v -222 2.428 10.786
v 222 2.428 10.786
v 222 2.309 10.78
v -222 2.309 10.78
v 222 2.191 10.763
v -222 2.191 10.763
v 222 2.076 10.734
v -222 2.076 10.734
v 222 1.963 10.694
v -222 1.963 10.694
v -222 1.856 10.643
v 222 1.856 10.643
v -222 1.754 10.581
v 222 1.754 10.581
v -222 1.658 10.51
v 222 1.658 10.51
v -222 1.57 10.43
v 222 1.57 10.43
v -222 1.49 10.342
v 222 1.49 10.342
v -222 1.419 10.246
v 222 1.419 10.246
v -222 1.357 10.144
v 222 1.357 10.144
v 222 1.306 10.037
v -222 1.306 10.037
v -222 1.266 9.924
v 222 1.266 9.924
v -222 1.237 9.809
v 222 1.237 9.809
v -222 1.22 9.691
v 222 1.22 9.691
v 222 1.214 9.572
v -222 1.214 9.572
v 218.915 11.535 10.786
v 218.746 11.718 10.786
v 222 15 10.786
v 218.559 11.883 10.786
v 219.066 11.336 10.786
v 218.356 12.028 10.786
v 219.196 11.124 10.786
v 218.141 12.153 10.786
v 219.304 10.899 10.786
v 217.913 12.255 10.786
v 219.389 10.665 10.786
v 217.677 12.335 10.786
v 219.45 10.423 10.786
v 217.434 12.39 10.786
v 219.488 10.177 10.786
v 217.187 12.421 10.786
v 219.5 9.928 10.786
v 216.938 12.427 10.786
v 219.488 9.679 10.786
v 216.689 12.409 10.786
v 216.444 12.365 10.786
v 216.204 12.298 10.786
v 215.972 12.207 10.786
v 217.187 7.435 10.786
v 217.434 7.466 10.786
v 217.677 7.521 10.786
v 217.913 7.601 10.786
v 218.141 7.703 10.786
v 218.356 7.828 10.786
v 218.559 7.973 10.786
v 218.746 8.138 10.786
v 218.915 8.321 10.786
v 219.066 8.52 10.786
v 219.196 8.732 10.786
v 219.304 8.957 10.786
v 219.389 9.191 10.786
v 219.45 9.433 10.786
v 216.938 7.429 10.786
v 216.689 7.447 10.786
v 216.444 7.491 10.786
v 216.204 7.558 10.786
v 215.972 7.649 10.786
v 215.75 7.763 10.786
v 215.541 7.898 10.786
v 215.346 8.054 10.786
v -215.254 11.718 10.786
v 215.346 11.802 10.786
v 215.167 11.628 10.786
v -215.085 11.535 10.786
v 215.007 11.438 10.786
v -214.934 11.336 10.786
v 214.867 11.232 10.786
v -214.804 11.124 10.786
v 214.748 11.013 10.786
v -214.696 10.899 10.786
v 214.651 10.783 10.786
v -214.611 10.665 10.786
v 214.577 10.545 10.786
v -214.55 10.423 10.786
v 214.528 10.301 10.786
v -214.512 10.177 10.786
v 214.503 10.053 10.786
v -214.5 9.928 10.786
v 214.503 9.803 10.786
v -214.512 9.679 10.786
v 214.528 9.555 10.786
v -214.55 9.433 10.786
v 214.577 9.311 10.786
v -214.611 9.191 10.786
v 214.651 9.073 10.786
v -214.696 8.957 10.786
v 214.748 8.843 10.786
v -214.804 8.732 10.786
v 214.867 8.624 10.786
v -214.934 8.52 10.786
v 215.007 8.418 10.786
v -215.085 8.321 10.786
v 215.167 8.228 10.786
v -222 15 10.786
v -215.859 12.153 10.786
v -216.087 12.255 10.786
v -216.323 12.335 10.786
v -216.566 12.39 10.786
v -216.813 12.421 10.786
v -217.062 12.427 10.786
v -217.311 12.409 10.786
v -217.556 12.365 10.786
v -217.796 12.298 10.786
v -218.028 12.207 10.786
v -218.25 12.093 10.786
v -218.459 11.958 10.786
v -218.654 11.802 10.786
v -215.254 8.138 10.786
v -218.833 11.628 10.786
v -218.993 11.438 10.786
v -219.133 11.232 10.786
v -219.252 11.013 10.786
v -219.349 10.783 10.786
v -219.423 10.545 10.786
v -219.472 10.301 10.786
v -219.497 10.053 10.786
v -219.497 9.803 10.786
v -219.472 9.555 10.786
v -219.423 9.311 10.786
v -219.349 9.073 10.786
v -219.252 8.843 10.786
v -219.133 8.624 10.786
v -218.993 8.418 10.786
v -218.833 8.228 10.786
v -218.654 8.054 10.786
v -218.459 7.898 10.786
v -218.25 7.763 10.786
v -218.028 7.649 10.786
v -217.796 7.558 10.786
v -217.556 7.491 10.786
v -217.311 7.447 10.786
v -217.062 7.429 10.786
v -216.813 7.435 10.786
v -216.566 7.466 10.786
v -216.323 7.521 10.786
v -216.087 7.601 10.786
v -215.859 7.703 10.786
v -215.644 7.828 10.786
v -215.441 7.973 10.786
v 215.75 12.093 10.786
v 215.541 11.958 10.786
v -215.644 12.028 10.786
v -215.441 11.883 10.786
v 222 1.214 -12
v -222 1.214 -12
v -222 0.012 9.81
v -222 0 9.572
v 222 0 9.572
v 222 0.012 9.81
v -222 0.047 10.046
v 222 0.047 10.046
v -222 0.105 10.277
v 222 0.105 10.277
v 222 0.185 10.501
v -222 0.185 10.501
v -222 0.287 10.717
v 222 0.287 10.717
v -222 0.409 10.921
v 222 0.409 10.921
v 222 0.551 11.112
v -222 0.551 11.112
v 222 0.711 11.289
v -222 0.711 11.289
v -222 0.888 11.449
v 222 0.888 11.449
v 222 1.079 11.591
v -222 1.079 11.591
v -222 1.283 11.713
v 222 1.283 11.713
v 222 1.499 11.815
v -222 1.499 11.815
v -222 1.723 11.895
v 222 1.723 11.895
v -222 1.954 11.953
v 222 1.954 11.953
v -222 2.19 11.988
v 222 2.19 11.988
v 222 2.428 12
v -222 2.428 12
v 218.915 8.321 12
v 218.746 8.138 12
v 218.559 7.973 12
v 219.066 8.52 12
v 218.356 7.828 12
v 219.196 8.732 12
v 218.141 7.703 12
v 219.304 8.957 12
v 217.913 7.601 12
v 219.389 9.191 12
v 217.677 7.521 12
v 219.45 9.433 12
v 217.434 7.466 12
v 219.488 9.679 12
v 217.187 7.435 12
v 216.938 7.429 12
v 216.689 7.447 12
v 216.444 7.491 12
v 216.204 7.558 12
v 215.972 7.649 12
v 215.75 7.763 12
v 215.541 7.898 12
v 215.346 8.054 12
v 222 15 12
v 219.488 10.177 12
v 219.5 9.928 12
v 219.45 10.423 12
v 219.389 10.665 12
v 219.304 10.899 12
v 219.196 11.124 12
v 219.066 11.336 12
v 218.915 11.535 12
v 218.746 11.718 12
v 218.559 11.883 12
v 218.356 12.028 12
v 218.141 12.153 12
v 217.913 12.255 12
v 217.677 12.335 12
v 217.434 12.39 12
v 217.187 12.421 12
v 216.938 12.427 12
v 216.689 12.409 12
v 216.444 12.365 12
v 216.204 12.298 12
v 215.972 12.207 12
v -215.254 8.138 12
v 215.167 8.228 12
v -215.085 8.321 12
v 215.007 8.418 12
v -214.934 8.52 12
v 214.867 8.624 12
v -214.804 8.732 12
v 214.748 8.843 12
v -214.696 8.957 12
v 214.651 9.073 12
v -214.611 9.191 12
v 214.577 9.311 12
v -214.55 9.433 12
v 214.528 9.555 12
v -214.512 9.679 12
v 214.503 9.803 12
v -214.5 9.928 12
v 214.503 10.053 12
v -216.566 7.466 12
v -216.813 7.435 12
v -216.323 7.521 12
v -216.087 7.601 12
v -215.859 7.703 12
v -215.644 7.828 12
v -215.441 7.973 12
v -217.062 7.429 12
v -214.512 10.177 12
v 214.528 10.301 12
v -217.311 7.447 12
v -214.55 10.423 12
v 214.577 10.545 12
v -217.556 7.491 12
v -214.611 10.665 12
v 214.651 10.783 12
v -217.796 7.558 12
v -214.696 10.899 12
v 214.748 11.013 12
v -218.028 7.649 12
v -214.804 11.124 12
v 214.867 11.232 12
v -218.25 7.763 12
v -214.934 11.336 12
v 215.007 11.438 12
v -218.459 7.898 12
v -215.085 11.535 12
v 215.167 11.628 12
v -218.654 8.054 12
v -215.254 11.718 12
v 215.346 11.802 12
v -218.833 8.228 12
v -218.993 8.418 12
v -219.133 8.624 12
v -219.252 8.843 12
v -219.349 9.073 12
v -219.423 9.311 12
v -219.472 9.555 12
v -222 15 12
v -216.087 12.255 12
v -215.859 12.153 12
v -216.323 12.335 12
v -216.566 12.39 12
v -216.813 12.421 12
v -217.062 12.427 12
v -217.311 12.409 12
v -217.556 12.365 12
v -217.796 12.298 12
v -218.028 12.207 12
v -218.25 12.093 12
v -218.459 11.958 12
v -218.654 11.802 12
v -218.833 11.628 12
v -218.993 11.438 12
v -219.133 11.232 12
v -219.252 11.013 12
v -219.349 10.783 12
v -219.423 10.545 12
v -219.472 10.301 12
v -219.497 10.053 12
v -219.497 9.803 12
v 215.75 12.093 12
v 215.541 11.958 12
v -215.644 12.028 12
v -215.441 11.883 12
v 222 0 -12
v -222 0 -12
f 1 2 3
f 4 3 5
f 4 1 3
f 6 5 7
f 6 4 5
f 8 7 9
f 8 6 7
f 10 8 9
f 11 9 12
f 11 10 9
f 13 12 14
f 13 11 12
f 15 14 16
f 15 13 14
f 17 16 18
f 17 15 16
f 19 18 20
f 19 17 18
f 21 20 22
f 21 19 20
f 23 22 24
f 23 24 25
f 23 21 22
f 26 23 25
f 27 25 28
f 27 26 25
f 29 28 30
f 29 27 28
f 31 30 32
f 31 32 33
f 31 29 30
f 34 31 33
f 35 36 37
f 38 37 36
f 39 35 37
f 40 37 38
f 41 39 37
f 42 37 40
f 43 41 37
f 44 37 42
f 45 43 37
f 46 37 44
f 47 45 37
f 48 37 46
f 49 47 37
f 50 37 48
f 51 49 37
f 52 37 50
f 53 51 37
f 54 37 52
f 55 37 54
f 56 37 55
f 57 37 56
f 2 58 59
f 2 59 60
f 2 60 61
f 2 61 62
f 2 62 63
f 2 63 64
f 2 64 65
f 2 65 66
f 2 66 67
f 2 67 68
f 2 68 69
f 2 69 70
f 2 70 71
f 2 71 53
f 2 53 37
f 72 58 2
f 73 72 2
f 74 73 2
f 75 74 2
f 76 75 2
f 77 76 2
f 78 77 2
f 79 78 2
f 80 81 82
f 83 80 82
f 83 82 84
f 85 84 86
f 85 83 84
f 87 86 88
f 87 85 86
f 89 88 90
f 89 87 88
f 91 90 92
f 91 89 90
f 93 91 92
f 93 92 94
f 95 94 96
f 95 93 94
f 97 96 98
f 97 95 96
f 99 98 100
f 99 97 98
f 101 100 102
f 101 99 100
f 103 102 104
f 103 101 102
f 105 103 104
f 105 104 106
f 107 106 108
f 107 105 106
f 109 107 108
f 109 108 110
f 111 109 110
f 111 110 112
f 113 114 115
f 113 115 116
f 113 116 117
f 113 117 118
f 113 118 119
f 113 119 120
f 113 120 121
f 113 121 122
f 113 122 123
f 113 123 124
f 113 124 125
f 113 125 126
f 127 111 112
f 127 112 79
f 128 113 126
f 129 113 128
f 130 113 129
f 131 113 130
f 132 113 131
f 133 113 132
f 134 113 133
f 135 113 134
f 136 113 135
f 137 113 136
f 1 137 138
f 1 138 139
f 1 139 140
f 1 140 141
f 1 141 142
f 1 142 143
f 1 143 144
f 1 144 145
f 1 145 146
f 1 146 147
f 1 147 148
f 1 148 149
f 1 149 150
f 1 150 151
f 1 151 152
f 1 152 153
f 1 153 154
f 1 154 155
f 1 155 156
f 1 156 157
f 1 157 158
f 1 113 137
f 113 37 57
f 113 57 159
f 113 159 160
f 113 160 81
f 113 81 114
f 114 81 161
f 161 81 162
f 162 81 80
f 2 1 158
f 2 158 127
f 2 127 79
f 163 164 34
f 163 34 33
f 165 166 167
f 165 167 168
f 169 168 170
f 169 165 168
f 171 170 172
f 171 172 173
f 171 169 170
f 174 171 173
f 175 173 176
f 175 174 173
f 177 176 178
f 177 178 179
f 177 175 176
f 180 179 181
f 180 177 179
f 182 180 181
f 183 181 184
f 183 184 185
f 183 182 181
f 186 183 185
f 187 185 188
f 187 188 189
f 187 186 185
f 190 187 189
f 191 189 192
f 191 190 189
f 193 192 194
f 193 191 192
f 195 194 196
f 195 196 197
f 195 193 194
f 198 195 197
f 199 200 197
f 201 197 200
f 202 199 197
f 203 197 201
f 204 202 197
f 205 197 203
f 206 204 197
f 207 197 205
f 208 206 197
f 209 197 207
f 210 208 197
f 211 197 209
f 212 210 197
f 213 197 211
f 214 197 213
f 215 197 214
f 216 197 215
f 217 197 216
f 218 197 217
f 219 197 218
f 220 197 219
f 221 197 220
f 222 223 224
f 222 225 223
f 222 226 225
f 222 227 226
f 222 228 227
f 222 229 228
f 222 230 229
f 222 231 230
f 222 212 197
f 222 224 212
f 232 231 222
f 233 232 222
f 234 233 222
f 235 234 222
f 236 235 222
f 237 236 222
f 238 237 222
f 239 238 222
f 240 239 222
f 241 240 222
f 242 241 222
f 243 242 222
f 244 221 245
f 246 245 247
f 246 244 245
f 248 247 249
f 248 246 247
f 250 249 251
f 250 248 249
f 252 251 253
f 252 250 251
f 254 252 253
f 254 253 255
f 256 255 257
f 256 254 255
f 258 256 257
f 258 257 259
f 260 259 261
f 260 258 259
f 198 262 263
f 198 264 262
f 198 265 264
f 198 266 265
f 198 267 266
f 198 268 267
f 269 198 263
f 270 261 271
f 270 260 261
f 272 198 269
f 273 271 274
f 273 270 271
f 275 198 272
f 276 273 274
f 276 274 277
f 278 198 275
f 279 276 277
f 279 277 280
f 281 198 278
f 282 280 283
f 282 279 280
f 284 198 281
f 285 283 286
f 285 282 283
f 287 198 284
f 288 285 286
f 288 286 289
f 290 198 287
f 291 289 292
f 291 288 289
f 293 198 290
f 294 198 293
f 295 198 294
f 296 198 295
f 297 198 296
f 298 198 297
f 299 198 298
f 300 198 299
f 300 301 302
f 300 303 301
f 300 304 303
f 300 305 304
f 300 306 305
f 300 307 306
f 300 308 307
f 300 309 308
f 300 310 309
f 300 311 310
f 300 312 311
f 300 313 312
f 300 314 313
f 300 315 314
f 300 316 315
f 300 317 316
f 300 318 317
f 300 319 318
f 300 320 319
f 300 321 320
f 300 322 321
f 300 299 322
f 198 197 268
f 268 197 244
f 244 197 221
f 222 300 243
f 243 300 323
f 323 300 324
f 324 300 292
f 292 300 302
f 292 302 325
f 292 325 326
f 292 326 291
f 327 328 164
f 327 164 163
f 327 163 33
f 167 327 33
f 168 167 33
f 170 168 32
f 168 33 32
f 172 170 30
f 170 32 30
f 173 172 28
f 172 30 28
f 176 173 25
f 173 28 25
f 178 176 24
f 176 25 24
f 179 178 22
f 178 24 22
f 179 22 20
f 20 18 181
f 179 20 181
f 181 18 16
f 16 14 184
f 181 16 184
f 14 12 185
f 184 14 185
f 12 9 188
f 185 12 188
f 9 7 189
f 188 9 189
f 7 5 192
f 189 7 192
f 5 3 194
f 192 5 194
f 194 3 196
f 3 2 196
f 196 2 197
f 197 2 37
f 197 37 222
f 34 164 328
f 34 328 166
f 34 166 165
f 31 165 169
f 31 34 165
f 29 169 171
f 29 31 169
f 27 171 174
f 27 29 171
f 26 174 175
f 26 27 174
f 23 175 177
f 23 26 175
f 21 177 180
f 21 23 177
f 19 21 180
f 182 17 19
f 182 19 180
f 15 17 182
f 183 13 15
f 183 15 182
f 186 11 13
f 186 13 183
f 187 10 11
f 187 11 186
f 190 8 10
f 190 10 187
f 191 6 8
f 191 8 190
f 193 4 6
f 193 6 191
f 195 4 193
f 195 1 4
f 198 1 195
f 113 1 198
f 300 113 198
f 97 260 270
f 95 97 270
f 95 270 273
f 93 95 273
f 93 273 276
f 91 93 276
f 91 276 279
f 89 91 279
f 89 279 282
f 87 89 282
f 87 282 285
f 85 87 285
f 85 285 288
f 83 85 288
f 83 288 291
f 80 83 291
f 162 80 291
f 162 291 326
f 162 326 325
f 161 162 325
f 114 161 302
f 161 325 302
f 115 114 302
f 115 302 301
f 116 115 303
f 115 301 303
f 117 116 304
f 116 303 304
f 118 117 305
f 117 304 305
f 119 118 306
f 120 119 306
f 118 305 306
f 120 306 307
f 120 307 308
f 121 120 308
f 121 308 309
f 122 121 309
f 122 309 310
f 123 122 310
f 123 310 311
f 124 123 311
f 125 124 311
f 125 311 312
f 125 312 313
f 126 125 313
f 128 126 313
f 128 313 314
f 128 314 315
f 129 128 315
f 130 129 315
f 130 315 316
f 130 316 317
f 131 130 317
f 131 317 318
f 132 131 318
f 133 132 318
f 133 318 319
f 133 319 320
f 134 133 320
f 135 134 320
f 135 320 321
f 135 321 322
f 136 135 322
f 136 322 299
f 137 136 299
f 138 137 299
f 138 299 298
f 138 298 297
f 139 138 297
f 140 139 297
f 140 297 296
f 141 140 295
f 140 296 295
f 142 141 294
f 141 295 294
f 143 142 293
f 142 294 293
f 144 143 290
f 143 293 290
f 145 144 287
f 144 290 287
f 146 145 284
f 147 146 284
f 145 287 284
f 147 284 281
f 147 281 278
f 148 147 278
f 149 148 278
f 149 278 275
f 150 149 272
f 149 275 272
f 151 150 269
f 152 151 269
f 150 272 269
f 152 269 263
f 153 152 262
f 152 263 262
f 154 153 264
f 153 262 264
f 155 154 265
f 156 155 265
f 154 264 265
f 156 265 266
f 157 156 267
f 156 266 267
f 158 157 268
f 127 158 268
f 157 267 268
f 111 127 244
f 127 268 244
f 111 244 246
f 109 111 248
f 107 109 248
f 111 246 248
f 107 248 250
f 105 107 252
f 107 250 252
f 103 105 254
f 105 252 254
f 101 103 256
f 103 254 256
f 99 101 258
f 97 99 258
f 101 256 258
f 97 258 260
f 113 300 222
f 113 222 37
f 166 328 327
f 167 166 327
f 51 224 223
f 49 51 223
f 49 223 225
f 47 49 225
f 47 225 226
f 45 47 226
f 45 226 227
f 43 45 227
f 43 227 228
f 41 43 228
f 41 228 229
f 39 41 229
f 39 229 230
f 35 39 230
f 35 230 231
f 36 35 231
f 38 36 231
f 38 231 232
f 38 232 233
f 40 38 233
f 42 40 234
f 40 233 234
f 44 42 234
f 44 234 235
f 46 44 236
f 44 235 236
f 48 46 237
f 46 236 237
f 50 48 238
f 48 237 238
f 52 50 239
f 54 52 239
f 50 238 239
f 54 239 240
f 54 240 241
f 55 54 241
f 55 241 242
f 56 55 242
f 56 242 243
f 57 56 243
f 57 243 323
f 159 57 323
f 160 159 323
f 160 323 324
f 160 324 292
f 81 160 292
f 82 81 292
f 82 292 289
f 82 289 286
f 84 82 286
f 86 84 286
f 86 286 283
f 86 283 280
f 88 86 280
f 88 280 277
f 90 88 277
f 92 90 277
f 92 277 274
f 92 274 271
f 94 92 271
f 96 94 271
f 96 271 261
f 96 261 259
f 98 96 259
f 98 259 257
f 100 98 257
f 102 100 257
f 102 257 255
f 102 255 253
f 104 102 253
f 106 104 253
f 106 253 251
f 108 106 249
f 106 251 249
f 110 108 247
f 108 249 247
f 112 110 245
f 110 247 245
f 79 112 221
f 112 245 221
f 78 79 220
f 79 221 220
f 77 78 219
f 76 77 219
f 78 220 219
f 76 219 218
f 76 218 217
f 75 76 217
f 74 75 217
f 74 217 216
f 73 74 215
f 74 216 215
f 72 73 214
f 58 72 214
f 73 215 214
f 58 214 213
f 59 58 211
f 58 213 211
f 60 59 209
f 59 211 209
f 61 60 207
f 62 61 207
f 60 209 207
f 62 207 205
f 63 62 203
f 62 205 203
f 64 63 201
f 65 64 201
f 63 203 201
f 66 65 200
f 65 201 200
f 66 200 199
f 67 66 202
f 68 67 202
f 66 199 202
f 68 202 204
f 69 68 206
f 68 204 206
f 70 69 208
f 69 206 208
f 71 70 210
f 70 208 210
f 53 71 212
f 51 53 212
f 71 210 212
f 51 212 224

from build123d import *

# Parameters (mm, degrees)
SKETCH1_W                    = 444
SKETCH1_H                    = 24
BASE_FLANGE1_DEPTH           = 1.214
EDGE_FLANGE1_STRIP_W         = 7.284
EDGE_FLANGE1_STRIP_H         = 1.214
EDGE_FLANGE1_STRIP_CUT_DEPTH = 444
EDGE_FLANGE1_DEPTH           = 444
SKETCH9_R                    = 2.5
CUT_EXTRUDE1_DEPTH           = 10


# Sheet-metal steps are written as plain solids
with BuildPart() as part:
    # Sketch1 → Base-Flange1 (new body)
    with BuildSketch(Plane(origin=(0, 0, 0), x_dir=(1, 0, 0), z_dir=(0, 1, 0))):
        Rectangle(SKETCH1_W, SKETCH1_H)
    extrude(amount=BASE_FLANGE1_DEPTH)

    # Edge-Flange1 strip (across the edge) → Edge-Flange1 strip cut (cut)
    with BuildSketch(Plane(origin=(-222, 1.214, 12), x_dir=(0, 0, -1), z_dir=(1, 0, 0))):
        with Locations((-1.214, -0.607)):
            Rectangle(EDGE_FLANGE1_STRIP_W, EDGE_FLANGE1_STRIP_H)
    extrude(amount=EDGE_FLANGE1_STRIP_CUT_DEPTH, mode=Mode.SUBTRACT)

    # Edge-Flange1 section (across the edge) → Edge-Flange1 (add)
    with BuildSketch(Plane(origin=(-222, 1.214, 12), x_dir=(0, 0, -1), z_dir=(1, 0, 0))):
        with BuildLine():
            Line((0, 1.214), (0, 13.786))
            Line((0, 13.786), (1.214, 13.786))
            Line((1.214, 13.786), (1.214, 1.214))
            ThreePointArc((1.214, 1.214), (1.569572368, 0.355572368), (2.428, 0))
            Line((2.428, 0), (2.428, -1.214))
            ThreePointArc((2.428, -1.214), (0.711144735, -0.502855265), (0, 1.214))
        make_face()
    extrude(amount=EDGE_FLANGE1_DEPTH)

    # Sketch9 → Cut-Extrude1 (cut)
    with BuildSketch(Plane.XY.offset(12)):
        with Locations((217, 9.928)):
            Circle(SKETCH9_R)
        with Locations((-217, 9.928)):
            Circle(SKETCH9_R)
    extrude(amount=-CUT_EXTRUDE1_DEPTH, mode=Mode.SUBTRACT)


solid = part.part
